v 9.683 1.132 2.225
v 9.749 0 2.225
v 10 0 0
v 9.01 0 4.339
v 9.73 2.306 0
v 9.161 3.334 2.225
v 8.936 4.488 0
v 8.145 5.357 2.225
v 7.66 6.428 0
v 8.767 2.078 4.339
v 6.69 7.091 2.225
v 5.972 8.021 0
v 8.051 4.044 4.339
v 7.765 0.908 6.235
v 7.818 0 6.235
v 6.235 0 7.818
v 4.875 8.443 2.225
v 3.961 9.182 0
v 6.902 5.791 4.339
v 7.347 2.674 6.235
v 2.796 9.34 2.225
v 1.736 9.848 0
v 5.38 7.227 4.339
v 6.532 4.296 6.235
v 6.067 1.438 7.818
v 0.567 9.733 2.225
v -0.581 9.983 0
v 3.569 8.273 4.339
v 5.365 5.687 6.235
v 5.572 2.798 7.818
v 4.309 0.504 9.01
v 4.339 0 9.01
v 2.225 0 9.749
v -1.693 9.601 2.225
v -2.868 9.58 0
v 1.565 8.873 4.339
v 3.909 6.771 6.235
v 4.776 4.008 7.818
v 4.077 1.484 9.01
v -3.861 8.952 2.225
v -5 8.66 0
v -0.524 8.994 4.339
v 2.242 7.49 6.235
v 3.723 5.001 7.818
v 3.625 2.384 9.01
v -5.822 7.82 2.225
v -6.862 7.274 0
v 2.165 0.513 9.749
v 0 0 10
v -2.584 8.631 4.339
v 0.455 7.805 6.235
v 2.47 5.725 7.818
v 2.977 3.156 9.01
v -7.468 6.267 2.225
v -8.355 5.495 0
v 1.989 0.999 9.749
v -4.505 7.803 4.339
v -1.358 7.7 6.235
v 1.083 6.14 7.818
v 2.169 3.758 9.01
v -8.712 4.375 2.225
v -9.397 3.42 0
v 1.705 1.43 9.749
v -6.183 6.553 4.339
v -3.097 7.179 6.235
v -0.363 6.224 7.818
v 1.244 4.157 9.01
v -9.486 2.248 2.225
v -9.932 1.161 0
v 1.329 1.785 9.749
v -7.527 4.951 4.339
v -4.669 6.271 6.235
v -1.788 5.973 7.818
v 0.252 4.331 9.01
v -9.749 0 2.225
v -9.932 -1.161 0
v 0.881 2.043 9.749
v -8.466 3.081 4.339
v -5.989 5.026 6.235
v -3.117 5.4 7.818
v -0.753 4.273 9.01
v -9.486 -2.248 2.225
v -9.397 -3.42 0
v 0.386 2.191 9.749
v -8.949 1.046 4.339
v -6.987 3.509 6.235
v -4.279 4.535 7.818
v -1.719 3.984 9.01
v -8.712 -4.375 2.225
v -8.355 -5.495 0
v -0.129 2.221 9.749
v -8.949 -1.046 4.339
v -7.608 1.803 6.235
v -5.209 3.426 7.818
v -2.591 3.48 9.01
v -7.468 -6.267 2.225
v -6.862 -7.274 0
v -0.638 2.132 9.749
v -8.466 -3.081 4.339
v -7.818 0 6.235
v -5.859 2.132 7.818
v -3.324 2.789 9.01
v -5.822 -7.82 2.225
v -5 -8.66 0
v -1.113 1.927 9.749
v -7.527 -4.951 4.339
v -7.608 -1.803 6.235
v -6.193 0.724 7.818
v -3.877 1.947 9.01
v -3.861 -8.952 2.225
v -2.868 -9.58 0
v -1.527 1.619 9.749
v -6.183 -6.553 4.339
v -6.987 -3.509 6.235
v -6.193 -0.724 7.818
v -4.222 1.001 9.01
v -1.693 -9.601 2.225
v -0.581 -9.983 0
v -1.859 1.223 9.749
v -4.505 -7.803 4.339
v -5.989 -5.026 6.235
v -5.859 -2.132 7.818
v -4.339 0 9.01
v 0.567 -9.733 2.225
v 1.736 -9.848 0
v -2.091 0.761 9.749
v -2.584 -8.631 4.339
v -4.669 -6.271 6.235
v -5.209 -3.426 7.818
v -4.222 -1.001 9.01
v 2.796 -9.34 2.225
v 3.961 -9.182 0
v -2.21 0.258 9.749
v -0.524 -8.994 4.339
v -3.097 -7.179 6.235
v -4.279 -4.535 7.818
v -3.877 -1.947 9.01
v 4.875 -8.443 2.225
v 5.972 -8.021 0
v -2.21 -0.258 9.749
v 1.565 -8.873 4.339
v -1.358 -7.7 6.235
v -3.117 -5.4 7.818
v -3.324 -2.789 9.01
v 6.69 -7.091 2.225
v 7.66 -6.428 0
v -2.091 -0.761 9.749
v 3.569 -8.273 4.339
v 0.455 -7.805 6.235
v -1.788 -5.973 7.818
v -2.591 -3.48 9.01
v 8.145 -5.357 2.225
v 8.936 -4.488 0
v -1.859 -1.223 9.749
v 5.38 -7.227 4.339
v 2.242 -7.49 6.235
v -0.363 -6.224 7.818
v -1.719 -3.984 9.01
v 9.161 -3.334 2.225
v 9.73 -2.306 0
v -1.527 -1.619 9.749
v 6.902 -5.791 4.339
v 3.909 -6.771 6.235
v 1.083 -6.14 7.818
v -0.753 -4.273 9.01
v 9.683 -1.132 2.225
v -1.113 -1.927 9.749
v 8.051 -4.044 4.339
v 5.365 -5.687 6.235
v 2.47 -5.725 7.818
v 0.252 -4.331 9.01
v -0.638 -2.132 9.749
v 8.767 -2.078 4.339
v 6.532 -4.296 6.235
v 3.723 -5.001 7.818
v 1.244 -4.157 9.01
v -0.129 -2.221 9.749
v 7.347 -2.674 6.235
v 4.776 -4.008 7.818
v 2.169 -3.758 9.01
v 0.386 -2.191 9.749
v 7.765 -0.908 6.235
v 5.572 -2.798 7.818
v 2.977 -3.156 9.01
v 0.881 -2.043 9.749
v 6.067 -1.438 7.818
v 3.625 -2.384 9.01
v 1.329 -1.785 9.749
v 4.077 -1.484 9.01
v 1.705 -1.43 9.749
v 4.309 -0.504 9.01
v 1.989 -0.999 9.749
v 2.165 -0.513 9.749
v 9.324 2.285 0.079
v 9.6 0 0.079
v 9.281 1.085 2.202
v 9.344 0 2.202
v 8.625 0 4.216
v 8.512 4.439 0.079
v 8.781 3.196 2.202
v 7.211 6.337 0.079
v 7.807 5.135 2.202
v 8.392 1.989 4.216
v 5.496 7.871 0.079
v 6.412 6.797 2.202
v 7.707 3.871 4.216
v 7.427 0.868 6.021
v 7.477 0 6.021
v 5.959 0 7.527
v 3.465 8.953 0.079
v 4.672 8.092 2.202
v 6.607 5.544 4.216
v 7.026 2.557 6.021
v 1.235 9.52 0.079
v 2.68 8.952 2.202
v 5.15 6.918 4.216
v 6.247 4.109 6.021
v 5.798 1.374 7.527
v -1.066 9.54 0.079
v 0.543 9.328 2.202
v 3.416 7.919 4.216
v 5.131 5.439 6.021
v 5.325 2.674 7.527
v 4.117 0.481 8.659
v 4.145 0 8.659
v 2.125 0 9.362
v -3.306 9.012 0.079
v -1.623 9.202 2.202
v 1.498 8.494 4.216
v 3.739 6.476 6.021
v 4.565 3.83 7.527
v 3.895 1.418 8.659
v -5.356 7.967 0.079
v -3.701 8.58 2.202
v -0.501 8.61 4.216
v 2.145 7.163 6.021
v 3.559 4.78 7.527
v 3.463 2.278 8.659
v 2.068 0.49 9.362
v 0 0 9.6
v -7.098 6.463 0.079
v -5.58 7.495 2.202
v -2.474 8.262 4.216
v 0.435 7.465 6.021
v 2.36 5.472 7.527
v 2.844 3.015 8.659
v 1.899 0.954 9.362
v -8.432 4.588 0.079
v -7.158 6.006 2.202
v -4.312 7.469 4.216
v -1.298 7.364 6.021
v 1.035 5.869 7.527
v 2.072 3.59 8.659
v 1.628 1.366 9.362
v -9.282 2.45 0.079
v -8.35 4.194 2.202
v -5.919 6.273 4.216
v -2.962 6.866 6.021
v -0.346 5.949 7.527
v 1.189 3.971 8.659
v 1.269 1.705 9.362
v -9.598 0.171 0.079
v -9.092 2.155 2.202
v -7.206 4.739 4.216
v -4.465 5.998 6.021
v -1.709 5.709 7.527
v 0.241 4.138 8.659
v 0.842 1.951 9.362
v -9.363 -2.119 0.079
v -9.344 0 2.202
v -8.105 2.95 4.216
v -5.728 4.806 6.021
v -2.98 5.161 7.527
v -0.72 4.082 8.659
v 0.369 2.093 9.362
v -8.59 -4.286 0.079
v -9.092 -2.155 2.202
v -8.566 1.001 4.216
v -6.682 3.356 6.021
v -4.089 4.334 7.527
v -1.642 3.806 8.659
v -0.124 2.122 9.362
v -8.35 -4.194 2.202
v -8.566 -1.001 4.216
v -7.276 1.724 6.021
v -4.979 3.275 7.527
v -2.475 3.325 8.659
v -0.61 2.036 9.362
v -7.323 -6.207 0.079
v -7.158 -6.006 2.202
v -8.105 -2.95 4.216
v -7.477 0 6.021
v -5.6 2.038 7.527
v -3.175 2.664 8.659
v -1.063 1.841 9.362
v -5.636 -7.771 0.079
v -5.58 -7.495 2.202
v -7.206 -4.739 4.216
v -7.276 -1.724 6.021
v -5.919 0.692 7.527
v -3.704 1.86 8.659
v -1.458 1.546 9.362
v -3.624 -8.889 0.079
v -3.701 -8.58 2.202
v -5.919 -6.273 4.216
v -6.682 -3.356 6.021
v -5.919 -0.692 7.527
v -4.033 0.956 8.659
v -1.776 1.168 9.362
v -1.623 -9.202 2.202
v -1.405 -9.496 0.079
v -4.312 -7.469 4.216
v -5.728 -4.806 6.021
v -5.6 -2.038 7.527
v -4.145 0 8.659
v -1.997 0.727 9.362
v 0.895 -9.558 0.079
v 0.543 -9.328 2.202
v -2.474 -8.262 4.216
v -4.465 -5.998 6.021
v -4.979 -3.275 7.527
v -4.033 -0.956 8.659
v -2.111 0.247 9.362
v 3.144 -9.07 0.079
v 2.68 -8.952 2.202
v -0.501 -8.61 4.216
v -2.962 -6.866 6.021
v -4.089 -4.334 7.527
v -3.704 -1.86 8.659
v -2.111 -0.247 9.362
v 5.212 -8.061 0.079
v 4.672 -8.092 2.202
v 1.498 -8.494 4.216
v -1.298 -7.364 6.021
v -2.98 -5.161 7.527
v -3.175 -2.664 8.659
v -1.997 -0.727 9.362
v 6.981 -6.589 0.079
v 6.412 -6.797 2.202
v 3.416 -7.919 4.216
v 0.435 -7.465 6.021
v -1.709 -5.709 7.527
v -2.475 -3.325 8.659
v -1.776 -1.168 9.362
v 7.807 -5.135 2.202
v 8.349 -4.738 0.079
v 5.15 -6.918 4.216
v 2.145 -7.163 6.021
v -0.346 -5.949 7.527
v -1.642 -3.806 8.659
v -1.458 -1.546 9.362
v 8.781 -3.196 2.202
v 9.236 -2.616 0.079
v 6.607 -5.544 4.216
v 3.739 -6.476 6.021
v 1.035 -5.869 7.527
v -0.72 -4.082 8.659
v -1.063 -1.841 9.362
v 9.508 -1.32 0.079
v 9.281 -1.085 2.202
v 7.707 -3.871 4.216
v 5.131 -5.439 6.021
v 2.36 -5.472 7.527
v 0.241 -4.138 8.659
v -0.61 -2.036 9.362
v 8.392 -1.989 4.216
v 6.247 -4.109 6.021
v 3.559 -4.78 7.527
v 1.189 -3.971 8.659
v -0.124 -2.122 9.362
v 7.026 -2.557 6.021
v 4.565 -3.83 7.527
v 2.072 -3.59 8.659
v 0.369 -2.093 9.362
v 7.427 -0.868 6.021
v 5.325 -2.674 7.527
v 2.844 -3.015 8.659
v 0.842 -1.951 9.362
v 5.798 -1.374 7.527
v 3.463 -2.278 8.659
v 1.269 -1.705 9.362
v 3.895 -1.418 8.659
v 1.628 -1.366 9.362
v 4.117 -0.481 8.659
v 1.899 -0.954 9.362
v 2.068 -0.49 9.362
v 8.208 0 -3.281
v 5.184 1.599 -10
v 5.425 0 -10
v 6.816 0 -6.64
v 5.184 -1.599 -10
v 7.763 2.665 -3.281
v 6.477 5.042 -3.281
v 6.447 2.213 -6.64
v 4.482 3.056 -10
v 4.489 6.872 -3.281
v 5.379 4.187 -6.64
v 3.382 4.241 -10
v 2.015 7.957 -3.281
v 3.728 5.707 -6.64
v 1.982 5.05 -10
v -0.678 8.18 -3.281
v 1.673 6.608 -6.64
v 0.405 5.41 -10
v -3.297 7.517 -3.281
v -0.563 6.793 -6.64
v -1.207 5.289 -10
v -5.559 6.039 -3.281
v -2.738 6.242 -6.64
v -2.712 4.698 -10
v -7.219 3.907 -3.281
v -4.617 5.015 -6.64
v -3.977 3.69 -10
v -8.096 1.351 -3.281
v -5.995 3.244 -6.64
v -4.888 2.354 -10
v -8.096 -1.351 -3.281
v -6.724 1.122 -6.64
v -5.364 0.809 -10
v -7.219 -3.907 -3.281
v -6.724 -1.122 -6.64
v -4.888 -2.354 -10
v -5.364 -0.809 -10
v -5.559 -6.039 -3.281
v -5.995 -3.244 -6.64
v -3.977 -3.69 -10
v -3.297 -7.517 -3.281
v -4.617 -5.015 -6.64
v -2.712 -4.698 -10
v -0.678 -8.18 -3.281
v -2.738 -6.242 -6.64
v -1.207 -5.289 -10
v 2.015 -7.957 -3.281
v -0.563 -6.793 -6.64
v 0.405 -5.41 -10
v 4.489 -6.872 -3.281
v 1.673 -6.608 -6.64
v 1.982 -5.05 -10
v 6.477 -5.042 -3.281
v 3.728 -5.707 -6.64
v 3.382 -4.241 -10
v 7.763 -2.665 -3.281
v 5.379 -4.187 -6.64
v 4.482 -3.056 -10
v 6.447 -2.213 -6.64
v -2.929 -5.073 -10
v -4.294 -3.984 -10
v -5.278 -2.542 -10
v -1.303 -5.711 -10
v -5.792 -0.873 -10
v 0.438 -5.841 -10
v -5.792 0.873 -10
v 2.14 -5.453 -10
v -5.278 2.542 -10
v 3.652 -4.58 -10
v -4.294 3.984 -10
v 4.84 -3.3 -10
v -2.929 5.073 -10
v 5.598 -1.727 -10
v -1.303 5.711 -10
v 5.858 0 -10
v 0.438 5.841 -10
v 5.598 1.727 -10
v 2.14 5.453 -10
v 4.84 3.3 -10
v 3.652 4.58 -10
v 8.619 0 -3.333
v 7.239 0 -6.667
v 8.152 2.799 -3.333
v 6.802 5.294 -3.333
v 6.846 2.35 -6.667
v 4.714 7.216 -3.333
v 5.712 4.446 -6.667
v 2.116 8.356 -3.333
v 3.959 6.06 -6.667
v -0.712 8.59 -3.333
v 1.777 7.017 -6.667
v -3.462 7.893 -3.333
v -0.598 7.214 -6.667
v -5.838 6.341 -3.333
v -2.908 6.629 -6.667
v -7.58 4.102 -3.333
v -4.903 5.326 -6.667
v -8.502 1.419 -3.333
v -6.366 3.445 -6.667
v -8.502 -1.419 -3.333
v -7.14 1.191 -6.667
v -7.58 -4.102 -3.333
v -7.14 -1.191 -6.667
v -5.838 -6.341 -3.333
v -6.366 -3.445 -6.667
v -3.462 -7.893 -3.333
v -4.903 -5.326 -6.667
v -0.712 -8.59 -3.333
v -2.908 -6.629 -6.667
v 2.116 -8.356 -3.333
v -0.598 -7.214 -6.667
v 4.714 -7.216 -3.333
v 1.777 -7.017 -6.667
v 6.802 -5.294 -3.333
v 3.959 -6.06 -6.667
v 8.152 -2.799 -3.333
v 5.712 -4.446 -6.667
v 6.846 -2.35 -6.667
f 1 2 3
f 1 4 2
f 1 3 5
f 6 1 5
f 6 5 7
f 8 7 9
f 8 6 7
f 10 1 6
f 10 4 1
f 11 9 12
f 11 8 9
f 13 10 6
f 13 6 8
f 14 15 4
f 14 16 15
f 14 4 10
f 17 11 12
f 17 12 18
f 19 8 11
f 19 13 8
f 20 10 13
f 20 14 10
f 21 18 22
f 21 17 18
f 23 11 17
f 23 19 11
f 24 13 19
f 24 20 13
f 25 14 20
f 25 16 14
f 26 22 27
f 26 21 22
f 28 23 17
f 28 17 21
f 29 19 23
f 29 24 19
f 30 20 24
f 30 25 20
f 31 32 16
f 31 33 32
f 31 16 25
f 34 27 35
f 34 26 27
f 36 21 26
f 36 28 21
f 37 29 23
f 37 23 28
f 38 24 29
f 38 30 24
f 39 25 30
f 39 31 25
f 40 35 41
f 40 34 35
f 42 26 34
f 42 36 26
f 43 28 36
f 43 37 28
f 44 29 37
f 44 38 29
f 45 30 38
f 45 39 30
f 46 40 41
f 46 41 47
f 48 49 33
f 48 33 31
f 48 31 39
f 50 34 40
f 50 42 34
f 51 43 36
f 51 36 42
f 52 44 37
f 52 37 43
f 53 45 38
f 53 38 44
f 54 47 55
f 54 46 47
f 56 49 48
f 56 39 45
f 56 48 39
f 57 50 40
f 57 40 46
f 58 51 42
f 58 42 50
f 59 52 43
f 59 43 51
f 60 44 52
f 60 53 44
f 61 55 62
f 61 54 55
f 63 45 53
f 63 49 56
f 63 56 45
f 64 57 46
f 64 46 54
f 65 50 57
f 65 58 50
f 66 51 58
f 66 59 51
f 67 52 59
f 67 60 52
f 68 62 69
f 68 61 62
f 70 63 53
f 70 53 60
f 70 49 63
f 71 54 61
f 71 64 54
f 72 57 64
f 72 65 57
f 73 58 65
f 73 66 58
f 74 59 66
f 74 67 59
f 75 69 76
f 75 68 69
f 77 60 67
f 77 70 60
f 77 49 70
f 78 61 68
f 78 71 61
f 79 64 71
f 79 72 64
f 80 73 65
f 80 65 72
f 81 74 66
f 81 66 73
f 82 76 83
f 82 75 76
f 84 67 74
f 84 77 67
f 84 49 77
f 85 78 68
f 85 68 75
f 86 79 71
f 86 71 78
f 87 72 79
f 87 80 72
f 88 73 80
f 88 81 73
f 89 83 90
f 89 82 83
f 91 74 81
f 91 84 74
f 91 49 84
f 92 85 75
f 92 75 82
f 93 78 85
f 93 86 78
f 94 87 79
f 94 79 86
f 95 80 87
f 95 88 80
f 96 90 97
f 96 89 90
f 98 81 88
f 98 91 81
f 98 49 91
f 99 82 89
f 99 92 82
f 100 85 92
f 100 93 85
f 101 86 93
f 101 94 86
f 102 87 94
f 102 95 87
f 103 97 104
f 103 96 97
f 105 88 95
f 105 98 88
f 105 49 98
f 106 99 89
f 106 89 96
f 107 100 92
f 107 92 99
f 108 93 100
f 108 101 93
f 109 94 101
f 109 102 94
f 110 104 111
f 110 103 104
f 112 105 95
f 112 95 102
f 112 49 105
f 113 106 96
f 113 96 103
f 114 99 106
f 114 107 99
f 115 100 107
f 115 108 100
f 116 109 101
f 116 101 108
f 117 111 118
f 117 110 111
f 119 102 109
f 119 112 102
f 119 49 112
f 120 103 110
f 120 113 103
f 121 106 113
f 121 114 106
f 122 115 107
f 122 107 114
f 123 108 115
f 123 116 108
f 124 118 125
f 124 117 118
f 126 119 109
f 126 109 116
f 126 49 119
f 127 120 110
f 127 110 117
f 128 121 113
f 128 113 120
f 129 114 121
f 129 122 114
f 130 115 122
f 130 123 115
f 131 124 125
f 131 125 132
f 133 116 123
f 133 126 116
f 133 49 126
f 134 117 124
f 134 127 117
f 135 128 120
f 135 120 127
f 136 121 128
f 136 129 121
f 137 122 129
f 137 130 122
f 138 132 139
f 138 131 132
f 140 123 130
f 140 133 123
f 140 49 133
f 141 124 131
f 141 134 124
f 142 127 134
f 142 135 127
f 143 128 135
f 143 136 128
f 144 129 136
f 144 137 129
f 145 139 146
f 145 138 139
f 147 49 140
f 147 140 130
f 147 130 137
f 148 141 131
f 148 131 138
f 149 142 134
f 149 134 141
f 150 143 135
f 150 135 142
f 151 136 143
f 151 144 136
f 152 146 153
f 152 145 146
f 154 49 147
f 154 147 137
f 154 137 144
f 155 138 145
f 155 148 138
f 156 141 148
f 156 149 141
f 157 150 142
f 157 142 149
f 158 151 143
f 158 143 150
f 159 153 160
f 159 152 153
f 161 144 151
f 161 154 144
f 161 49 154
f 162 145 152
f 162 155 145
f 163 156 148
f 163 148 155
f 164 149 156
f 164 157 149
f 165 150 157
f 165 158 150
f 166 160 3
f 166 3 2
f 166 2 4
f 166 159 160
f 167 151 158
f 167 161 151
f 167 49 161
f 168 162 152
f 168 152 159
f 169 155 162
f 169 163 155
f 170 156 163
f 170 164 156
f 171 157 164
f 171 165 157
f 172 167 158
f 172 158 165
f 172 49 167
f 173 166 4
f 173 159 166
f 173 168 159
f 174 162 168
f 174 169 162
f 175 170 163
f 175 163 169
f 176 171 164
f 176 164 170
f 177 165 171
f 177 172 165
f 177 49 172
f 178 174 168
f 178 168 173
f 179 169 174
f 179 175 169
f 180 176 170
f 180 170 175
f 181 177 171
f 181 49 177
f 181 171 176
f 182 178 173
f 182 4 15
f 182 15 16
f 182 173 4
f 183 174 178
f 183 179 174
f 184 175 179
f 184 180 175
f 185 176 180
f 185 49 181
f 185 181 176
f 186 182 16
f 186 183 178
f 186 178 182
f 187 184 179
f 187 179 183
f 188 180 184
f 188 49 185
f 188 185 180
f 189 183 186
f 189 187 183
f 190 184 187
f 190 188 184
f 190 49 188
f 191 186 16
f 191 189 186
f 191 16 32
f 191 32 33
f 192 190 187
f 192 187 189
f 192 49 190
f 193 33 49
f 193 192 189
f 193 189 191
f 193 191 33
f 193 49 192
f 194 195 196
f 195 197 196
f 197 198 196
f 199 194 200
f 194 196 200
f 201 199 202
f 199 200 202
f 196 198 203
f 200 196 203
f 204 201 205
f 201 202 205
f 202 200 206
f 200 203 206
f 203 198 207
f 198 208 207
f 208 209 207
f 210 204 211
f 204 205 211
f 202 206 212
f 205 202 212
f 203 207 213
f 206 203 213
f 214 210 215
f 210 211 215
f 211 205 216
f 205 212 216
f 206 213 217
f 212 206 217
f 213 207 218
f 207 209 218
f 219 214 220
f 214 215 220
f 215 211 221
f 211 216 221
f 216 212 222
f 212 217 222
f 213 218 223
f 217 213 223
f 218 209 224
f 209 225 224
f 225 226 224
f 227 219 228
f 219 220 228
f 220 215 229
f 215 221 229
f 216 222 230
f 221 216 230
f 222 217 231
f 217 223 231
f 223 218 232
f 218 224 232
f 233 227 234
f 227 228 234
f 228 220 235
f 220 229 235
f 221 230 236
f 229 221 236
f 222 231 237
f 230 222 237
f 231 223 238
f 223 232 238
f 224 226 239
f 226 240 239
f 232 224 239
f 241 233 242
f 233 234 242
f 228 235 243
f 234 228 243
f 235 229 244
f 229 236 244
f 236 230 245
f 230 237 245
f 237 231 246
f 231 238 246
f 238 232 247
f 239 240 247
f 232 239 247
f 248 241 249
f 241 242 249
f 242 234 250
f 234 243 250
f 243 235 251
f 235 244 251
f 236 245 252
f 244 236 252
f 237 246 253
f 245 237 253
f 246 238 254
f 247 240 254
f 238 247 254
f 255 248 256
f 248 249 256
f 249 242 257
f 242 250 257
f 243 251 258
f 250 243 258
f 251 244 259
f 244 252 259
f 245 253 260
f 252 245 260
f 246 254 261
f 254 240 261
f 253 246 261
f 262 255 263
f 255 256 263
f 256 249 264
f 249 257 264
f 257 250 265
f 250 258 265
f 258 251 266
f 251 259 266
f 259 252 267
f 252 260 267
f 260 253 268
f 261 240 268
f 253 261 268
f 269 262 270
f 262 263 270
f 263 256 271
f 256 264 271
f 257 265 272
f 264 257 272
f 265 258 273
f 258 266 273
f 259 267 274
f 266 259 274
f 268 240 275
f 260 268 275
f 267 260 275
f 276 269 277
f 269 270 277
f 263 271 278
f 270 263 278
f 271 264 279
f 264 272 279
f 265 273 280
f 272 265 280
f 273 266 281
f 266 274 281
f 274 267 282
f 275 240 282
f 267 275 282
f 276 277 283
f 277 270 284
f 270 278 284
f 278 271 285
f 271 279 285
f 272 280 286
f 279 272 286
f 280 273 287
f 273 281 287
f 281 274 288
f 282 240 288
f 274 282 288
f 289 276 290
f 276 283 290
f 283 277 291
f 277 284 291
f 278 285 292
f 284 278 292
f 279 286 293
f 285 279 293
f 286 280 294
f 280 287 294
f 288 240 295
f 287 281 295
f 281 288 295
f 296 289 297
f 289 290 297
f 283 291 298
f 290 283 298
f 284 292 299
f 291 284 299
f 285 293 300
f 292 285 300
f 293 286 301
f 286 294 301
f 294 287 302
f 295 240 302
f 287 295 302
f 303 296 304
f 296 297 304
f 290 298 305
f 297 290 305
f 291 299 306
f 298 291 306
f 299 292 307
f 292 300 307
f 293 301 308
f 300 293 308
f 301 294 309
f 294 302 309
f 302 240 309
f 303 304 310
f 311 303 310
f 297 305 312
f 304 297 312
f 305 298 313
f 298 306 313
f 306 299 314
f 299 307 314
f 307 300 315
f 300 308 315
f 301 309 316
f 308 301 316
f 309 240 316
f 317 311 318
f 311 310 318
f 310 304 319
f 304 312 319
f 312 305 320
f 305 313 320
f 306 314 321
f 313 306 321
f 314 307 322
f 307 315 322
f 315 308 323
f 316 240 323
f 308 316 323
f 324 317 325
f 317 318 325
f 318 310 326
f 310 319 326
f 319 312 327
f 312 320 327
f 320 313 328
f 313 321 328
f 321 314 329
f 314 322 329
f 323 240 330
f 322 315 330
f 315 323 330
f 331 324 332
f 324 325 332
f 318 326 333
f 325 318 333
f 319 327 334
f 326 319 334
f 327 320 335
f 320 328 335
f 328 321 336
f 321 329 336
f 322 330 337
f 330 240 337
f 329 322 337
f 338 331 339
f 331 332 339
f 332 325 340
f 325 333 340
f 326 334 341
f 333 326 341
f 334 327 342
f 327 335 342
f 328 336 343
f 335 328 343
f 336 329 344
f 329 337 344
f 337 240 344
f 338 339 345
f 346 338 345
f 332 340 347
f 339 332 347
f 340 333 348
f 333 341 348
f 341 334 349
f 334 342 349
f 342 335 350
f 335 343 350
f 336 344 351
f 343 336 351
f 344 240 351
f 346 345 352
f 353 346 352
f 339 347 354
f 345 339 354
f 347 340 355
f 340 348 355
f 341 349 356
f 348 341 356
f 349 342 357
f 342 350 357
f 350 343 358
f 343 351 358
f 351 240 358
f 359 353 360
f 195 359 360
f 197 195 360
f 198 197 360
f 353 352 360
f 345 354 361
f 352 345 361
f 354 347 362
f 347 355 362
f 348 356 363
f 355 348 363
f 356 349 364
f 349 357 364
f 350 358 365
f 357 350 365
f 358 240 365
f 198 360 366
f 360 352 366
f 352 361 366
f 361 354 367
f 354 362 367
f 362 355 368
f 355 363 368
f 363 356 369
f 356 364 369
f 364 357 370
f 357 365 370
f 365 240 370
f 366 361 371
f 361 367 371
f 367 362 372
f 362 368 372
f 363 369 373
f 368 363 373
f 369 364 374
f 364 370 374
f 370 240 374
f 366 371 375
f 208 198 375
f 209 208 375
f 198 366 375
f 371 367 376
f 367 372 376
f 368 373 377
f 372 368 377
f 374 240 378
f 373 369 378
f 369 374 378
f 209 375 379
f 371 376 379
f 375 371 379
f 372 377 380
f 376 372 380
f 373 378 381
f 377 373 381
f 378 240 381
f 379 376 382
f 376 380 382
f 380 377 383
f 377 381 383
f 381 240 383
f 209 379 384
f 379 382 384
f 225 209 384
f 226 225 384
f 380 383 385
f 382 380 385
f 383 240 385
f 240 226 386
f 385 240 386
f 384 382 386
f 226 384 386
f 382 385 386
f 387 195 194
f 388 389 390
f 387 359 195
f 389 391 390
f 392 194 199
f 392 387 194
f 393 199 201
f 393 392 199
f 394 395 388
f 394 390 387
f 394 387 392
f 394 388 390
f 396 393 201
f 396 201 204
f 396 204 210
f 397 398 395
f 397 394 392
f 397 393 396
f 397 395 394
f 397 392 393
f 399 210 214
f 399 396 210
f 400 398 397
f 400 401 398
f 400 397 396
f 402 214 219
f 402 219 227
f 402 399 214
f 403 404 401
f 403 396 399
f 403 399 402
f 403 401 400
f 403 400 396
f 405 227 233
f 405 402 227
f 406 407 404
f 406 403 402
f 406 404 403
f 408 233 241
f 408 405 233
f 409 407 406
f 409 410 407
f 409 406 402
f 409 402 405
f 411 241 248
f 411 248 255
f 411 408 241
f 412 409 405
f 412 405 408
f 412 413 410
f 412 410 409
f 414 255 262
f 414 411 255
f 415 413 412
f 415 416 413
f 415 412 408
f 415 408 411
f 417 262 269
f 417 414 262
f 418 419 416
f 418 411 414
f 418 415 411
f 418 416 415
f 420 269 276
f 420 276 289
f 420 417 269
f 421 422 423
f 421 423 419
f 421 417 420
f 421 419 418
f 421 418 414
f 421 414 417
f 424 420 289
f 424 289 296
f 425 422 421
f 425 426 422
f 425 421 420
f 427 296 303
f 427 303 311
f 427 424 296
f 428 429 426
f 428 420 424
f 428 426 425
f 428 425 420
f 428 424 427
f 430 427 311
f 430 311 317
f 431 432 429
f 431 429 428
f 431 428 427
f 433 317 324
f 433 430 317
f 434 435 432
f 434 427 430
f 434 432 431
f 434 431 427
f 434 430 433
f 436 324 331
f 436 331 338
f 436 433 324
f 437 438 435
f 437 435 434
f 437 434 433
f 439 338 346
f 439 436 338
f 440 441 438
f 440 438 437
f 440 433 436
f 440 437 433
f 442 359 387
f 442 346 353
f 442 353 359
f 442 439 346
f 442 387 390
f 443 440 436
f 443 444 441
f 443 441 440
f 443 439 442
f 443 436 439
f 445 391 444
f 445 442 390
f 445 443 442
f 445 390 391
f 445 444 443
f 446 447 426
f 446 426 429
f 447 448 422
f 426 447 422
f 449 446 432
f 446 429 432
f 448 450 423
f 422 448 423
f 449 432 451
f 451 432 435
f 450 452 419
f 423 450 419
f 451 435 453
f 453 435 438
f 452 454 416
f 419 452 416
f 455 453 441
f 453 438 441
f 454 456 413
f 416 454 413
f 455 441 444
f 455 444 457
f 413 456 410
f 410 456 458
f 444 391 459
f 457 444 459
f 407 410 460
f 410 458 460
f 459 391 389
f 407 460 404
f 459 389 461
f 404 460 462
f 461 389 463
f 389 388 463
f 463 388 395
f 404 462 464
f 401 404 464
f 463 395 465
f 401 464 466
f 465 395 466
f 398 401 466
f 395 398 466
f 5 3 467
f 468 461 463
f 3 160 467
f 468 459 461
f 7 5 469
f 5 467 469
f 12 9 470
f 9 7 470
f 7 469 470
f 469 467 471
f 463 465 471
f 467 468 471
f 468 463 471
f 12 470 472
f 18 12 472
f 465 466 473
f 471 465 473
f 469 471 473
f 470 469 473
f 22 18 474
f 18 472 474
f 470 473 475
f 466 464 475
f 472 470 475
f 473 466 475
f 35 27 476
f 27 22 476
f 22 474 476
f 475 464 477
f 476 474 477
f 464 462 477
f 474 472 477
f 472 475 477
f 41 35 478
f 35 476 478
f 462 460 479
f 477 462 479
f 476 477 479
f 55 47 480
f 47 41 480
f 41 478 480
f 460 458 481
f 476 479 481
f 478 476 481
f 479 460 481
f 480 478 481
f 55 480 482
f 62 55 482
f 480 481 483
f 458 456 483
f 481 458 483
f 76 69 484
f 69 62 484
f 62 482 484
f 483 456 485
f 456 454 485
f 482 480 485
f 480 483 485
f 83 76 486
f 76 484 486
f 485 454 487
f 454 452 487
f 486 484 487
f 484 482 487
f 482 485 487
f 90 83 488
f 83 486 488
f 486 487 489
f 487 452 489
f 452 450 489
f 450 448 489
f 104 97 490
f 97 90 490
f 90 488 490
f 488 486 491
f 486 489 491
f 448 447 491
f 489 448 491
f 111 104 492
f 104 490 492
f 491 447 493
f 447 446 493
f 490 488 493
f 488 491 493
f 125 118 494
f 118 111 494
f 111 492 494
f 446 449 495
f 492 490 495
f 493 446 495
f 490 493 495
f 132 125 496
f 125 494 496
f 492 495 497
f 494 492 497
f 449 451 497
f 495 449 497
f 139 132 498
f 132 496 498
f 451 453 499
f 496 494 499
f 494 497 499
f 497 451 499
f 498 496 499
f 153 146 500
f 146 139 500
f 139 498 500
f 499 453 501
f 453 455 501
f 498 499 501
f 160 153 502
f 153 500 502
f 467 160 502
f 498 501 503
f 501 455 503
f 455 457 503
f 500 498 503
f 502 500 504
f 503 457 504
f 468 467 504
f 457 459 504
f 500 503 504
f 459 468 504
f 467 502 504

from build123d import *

# Parameters (mm, degrees)
F0_R     = 10
F1_DEPTH = 10
F1_TAPER = 22.5
F4_T     = -0.4


with BuildPart() as f1:
    # F0 (on Top) → F1 (new body)
    with BuildSketch(Plane.XY):
        Circle(F0_R)
    extrude(amount=-F1_DEPTH, taper=F1_TAPER)

    # F2 (on Front) → F3 (revolve)
    with BuildSketch(Plane.XZ):
        with BuildLine():
            Line((0, 10), (0, 0))
            Line((0, 0), (10, 0))
            ThreePointArc((10, 0), (7.0710678119, 7.0710678119), (0, 10))
        make_face()
    revolve(axis=Axis((0, 0, -10), (0, 0, 1)))

    # F4
    f4_openings = [f1.faces().sort_by_distance(p)[0] for p in [
        (0, 0, -10),
    ]]
    offset(amount=F4_T, openings=f4_openings, kind=Kind.INTERSECTION)


solid = f1.part
